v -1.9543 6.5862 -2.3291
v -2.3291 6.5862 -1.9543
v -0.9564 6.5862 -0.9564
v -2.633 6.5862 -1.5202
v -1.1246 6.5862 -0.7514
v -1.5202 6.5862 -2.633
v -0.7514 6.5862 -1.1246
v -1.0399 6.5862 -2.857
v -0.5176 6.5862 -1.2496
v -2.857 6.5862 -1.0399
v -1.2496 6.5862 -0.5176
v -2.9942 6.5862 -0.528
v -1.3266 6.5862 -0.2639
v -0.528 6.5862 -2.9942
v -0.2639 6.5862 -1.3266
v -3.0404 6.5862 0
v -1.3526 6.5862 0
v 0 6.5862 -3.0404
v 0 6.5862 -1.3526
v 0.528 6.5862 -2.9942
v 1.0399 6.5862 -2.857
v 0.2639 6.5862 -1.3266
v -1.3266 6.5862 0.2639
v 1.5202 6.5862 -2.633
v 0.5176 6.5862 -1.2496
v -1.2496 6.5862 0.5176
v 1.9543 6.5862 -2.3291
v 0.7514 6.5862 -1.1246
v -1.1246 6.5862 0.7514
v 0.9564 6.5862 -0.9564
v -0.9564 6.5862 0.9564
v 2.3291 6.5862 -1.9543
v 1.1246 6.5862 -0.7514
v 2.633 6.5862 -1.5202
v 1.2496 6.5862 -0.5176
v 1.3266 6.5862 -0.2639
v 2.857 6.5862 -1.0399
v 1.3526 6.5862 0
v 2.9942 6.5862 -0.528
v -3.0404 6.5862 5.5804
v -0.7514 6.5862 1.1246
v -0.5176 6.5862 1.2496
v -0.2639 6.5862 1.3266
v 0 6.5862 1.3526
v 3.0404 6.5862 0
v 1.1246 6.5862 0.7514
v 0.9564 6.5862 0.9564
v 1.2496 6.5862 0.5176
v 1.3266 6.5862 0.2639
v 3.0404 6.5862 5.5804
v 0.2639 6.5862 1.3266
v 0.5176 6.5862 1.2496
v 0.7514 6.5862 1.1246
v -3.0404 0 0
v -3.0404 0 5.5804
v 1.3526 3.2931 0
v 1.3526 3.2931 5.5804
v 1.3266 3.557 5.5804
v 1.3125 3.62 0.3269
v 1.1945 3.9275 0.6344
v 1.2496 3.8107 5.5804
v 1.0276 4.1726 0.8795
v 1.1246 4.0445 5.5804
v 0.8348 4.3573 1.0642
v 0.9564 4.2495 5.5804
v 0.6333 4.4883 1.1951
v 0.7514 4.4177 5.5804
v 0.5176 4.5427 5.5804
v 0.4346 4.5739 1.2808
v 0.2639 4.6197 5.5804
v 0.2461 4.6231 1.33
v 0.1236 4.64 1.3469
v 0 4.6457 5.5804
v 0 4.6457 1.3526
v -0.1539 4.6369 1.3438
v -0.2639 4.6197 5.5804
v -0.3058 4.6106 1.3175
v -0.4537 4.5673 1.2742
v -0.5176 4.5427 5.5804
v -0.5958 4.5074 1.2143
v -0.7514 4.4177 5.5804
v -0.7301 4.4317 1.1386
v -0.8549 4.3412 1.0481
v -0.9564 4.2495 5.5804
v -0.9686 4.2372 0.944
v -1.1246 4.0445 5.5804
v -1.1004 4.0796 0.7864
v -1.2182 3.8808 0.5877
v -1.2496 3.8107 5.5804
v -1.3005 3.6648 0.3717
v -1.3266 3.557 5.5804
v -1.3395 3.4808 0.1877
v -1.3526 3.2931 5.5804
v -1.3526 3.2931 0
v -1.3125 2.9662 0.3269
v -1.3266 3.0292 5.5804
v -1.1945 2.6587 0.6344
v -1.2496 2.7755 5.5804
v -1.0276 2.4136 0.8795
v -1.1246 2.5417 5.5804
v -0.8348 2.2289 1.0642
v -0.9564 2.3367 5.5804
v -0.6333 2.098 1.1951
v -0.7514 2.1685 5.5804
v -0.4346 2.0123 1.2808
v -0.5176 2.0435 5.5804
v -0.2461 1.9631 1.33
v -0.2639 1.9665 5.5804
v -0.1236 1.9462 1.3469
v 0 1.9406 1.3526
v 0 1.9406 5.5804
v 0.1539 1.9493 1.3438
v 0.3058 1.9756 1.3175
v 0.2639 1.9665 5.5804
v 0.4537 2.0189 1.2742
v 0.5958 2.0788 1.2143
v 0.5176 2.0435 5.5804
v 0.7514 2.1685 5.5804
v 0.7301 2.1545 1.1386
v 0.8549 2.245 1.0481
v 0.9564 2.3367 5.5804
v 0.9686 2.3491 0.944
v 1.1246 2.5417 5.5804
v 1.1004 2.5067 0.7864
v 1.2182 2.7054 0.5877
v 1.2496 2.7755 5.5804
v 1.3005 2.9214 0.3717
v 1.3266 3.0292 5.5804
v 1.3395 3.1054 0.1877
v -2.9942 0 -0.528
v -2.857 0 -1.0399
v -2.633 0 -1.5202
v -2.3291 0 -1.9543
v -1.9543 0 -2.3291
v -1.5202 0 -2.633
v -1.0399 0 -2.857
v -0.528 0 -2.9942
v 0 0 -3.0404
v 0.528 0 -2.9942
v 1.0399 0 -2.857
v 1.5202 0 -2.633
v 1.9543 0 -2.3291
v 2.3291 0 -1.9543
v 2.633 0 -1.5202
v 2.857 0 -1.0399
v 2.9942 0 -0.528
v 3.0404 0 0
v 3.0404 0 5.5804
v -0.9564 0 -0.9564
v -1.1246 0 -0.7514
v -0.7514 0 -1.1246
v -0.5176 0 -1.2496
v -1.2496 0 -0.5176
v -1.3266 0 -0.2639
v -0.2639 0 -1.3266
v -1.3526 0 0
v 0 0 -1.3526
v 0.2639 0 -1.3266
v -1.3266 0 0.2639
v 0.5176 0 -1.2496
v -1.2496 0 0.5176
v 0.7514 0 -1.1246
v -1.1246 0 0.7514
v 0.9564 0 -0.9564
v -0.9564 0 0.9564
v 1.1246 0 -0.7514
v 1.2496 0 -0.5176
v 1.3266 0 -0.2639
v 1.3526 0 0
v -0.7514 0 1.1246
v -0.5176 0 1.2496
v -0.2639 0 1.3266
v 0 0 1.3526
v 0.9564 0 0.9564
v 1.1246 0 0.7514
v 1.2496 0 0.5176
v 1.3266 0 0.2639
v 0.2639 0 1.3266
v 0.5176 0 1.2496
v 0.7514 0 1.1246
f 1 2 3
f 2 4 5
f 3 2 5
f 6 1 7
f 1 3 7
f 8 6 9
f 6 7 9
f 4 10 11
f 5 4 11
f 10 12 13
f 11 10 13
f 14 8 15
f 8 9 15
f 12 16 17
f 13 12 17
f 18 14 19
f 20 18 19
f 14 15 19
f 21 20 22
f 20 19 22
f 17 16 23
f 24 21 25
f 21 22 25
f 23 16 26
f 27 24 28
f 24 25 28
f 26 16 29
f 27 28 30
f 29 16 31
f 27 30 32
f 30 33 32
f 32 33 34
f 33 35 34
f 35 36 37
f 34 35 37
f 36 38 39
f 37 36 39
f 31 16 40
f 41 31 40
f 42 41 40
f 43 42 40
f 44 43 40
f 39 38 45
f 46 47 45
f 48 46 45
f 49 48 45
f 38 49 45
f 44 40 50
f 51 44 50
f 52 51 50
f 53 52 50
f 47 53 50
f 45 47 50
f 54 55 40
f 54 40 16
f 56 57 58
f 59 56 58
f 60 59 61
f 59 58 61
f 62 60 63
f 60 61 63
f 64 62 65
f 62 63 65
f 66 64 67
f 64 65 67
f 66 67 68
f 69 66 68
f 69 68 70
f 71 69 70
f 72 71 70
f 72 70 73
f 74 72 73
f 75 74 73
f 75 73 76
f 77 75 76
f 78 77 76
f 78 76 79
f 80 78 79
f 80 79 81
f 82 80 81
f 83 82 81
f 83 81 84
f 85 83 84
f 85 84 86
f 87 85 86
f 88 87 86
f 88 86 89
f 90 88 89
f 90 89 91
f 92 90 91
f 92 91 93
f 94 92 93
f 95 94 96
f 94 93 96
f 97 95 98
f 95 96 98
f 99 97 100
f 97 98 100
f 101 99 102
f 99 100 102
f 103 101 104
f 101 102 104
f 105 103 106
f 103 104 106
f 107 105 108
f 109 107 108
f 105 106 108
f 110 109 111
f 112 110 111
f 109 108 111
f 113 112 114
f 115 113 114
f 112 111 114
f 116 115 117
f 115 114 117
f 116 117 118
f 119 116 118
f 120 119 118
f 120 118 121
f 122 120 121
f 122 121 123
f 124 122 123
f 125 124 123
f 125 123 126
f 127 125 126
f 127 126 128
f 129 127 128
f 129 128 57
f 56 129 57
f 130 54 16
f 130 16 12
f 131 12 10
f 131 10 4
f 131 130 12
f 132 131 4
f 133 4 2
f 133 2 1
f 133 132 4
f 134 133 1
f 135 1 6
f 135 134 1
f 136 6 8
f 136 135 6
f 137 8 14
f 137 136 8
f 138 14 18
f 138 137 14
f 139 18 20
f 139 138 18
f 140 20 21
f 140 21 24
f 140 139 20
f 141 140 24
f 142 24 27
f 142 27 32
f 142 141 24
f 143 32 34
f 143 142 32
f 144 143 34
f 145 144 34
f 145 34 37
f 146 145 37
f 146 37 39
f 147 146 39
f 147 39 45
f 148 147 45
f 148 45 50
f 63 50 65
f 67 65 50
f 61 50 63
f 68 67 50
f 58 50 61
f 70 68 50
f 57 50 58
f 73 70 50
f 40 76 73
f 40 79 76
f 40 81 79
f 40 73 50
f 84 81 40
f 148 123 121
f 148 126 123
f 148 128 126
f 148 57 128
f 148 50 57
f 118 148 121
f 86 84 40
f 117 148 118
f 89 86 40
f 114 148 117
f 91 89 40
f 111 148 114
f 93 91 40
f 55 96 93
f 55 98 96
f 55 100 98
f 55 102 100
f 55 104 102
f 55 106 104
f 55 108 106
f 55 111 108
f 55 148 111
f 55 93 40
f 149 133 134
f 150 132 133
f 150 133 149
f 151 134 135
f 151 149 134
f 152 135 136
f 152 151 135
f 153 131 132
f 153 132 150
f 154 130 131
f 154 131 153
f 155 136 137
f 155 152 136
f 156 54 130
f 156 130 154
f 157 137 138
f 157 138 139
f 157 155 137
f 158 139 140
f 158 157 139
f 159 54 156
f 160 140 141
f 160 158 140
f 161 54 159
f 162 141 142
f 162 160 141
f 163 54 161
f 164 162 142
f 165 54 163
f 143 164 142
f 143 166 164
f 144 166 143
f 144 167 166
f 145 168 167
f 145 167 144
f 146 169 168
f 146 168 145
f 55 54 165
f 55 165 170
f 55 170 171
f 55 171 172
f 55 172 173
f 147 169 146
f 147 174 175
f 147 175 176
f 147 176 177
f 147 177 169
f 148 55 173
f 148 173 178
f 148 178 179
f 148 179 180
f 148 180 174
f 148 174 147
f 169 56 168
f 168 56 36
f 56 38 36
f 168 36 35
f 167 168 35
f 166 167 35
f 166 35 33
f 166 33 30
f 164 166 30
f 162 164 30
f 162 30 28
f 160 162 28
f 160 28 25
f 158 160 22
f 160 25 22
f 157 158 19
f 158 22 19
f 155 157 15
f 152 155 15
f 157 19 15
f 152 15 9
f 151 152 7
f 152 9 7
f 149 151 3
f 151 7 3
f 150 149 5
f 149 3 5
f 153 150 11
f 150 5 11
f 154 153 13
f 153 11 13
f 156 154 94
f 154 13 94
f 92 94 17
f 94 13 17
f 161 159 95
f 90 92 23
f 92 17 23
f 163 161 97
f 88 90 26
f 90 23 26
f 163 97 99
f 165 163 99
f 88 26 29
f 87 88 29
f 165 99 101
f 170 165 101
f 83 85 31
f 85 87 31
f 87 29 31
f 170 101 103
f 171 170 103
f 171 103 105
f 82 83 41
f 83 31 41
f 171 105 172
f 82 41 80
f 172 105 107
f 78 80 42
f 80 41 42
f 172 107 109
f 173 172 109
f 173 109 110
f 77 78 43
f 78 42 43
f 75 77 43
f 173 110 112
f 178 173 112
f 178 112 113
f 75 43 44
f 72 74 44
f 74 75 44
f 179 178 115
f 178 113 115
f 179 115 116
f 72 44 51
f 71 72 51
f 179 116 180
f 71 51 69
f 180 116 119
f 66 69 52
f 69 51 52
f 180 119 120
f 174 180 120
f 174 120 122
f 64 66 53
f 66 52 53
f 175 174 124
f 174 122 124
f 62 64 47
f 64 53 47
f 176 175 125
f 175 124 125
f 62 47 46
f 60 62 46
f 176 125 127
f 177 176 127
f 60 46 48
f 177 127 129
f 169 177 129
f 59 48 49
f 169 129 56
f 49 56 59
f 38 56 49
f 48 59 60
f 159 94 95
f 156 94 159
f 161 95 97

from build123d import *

# Parameters (mm, degrees)
BOSS_EXTRUDE1_DEPTH         = 6.58622
M2_5_CLEARANCE_HOLE1_D      = 2.7051
M2_5_CLEARANCE_HOLE2_REACH  = 13.267
M2_5_CLEARANCE_HOLE2_BORE_R = 1.35255


with BuildPart() as part:
    # Sketch1 → Boss-Extrude1 (new body)
    with BuildSketch(Plane.XZ):
        with BuildLine():
            Line((3.04038, 0), (3.04038, 5.58038))
            Line((3.04038, 5.58038), (-3.04038, 5.58038))
            Line((-3.04038, 5.58038), (-3.04038, 0))
            ThreePointArc((-3.04038, 0), (0, -3.04038), (3.04038, 0))
        make_face()
    extrude(amount=-BOSS_EXTRUDE1_DEPTH)

    # M2.5 Clearance Hole1 (through all)
    with Locations(Plane(origin=(0, 0, 0), x_dir=(-1, 0, 0), z_dir=(0, -1, 0))):
        with Locations((0, 0)):
            Hole(M2_5_CLEARANCE_HOLE1_D / 2)

    # M2.5 Clearance Hole2 bore → M2.5 Clearance Hole2 (cut, up to next)
    with BuildSketch(Plane.XY.offset(5.58038), mode=Mode.PRIVATE) as m2_5_clearance_hole2_sk1:
        with Locations((0, 3.29311)):
            Circle(M2_5_CLEARANCE_HOLE2_BORE_R)
    m2_5_clearance_hole2_tool1 = extrude(m2_5_clearance_hole2_sk1.sketch, amount=-M2_5_CLEARANCE_HOLE2_REACH, mode=Mode.PRIVATE) & part.part
    add(m2_5_clearance_hole2_tool1.solids().sort_by_distance((0, 3.29311, 5.58038))[0], mode=Mode.SUBTRACT)


solid = part.part
